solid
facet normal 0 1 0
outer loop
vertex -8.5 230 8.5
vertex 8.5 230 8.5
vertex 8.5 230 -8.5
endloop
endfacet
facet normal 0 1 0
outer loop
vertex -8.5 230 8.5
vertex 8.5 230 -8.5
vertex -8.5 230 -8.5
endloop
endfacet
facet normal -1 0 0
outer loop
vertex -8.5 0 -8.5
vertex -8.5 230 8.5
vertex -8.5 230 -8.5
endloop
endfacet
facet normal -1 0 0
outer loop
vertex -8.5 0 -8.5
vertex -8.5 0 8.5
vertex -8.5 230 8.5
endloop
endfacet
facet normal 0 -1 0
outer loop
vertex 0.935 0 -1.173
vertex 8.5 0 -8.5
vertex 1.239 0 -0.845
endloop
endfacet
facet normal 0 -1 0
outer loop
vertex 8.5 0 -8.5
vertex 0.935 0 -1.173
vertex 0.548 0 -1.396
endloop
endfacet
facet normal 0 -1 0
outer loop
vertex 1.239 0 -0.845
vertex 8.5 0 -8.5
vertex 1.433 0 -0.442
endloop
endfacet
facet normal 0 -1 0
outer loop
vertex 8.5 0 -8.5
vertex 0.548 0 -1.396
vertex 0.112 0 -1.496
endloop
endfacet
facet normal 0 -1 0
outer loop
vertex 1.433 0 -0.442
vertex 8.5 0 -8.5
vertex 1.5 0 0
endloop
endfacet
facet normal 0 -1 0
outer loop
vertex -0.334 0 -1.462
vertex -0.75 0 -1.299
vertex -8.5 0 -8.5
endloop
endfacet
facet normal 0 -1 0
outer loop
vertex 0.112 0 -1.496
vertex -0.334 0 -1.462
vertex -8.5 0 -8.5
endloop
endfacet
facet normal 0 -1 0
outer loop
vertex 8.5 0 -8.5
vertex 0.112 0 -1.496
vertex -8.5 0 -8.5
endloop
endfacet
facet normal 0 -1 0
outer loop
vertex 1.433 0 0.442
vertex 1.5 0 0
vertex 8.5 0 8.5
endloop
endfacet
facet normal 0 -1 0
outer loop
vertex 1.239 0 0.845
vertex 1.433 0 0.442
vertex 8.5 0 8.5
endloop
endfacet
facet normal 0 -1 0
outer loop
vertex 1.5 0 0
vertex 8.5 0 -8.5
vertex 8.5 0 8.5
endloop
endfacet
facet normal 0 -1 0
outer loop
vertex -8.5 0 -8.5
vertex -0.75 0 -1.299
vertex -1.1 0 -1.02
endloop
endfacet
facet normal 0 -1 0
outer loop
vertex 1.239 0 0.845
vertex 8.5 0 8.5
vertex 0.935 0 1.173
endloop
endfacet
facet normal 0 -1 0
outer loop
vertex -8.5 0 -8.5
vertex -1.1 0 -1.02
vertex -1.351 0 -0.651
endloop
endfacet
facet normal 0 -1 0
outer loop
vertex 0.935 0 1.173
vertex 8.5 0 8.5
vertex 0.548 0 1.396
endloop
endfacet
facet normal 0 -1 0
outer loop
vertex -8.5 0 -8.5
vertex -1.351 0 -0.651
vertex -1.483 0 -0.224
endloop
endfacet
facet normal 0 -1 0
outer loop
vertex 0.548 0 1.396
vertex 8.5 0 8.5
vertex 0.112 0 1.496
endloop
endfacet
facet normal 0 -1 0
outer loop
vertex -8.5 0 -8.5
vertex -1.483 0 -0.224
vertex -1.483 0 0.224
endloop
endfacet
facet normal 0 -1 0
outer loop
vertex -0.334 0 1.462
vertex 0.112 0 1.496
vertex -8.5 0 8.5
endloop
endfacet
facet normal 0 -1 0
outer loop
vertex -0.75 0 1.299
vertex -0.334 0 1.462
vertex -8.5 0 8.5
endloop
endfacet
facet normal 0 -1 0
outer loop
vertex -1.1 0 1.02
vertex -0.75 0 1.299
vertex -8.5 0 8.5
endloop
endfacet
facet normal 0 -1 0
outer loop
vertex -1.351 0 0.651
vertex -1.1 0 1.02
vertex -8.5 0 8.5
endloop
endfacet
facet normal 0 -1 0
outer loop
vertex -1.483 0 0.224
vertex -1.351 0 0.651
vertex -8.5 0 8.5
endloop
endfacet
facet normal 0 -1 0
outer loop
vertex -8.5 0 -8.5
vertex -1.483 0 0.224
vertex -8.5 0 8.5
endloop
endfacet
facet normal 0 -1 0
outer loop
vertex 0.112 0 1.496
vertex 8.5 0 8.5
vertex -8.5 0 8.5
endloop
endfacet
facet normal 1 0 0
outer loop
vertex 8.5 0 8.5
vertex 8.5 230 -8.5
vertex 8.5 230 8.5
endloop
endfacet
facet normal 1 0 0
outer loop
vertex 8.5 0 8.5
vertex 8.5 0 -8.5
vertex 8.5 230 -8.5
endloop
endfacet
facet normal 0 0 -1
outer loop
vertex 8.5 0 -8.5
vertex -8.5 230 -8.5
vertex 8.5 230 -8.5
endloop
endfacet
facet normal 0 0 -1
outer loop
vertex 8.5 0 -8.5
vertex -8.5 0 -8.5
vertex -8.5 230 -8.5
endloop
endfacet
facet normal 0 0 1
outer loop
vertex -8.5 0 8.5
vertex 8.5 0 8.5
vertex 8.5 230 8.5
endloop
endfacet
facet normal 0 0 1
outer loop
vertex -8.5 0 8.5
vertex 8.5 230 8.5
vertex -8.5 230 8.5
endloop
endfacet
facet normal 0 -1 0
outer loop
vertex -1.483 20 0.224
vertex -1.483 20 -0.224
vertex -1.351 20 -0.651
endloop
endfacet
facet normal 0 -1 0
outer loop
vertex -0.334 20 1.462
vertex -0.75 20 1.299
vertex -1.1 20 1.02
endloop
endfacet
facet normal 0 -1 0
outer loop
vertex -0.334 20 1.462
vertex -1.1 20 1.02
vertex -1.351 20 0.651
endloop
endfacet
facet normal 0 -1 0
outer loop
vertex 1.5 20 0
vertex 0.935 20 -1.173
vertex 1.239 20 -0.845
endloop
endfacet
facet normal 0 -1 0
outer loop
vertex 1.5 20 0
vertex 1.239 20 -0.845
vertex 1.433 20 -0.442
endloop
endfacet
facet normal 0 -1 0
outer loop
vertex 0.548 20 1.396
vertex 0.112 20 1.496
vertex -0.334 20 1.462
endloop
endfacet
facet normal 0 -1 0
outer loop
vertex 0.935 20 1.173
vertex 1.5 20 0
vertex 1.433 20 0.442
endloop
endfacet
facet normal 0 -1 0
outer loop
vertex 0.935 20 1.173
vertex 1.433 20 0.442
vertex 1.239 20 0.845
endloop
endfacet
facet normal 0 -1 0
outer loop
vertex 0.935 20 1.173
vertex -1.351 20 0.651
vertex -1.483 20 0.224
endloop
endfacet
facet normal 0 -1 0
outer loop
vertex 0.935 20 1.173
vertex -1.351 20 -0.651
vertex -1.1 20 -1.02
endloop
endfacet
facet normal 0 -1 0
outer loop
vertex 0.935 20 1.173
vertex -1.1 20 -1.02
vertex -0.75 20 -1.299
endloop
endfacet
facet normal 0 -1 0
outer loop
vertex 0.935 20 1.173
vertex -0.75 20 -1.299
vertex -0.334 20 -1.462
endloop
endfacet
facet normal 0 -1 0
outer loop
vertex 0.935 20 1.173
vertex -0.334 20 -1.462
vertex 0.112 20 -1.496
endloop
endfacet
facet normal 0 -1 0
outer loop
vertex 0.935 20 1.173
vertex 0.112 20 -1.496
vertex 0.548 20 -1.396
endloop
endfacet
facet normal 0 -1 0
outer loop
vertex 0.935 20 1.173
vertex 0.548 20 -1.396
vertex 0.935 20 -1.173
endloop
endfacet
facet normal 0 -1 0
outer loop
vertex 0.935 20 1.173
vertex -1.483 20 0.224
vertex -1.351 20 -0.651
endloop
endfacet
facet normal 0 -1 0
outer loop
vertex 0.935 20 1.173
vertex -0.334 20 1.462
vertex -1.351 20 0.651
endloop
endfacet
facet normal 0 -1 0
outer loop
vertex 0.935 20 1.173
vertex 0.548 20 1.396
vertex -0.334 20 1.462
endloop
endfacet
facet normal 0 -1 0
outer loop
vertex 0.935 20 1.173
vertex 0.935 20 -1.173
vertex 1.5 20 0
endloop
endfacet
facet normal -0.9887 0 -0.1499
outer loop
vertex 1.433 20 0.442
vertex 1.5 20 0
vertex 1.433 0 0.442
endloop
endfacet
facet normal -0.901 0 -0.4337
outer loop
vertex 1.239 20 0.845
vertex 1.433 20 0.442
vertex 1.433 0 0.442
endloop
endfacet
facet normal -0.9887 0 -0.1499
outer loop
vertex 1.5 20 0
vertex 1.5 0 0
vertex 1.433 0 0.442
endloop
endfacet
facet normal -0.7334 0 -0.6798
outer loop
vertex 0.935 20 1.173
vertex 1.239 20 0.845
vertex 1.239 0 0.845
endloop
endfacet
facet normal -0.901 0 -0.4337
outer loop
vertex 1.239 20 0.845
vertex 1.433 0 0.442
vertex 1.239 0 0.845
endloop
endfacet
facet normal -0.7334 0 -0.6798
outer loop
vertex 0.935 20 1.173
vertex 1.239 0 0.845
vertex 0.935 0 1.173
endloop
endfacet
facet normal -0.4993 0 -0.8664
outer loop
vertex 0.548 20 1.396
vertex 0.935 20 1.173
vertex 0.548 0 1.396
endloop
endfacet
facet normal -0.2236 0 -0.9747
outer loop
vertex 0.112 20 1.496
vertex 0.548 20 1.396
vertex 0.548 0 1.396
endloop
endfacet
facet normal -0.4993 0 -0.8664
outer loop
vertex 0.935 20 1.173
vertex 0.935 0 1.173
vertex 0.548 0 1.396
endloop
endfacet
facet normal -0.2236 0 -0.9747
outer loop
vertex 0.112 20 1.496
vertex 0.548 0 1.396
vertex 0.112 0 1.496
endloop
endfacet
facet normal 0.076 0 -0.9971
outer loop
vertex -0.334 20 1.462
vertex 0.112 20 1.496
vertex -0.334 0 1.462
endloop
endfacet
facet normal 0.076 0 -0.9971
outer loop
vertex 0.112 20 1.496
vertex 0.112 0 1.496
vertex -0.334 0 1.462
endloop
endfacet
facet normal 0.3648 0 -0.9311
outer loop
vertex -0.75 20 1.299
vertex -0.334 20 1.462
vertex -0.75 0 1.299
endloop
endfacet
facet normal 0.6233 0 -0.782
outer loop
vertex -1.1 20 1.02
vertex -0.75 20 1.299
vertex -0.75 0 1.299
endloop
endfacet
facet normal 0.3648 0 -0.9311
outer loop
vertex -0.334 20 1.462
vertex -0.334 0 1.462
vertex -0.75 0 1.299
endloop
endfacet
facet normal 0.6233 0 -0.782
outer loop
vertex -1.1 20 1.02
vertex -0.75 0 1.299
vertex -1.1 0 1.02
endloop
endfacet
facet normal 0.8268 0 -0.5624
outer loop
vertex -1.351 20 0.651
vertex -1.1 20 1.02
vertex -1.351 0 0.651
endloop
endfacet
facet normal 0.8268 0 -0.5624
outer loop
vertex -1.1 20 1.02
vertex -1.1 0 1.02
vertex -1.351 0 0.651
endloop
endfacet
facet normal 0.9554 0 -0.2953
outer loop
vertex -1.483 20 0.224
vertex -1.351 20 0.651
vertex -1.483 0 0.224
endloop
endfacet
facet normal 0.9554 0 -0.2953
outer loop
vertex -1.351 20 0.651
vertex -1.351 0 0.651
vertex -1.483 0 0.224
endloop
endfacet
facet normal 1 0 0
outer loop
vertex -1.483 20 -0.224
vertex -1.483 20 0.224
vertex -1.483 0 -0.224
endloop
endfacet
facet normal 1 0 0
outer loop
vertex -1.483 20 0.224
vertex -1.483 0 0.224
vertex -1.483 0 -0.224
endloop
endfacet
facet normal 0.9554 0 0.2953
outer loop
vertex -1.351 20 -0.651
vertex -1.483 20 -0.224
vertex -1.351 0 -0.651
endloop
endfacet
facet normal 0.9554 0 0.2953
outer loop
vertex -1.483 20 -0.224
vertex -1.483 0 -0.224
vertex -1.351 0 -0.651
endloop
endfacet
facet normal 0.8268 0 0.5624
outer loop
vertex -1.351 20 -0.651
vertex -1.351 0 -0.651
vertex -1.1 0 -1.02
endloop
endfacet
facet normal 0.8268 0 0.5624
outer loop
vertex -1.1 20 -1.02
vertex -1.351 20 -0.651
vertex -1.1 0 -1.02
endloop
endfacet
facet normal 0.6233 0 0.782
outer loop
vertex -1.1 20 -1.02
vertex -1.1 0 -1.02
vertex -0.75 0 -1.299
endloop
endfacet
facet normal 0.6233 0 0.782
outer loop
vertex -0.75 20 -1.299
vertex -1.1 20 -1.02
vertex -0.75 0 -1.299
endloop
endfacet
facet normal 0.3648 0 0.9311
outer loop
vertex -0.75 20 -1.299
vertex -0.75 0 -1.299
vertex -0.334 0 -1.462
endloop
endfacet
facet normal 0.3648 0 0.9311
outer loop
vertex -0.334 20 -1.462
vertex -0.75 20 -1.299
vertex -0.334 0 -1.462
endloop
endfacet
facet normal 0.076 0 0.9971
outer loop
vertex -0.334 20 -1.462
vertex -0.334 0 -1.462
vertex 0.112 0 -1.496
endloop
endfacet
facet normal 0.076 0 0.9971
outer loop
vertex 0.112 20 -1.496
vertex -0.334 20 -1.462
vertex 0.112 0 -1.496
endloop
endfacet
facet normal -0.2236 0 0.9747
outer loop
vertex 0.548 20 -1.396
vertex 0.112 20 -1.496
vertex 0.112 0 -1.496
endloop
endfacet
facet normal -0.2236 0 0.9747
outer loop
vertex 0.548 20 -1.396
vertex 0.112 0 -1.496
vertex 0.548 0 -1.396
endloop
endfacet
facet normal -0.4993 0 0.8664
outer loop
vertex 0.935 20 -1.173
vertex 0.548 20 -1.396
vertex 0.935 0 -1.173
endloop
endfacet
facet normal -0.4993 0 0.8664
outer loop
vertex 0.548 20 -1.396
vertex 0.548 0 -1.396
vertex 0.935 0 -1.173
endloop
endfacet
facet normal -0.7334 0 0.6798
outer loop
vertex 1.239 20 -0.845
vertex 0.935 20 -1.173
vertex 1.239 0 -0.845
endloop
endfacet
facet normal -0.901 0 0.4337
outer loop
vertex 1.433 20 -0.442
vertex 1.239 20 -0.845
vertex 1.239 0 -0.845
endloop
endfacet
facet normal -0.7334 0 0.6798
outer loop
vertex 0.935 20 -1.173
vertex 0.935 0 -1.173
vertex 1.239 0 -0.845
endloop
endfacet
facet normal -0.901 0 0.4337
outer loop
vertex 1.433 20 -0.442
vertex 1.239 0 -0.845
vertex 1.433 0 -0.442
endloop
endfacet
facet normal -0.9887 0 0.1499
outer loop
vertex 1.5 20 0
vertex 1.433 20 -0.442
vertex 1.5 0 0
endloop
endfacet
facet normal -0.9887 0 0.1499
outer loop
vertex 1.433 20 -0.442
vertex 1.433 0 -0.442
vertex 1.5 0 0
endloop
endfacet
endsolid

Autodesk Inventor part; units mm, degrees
ref_plane "YZ Plane" through (0, 0, 0) normal (1, 0, 0) x (0, 1, 0)
ref_plane "XZ Plane" through (0, 0, 0) normal (0, 1, 0) x (-1, 0, 0)
ref_plane "XY Plane" through (0, 0, 0) normal (0, 0, 1) x (1, 0, 0)
sketch "Sketch1" plane through (0, 0, 0) normal (0, 1, 0) x (-1, 0, 0)
  line L0 (-8.5, 8.5) -> (8.5, 8.5)
  line L1 (8.5, 8.5) -> (8.5, -8.5)
  line L2 (8.5, -8.5) -> (-8.5, -8.5)
  line L3 (-8.5, -8.5) -> (-8.5, 8.5)
  line L4 (-8.5, 8.5) -> (8.5, -8.5) construction
  line L5 (8.5, 8.5) -> (-8.5, -8.5) construction
  point P0 (0, 0)
  dimension "d0" = 17
  dimension "d1" = 17
extrude "Extrusion1" add sketch "Sketch1" along normal blind 230
sketch "Sketch2" plane through (0, 0, 0) normal (0, -1, 0) x (1, 0, 0)
  circle A0 centre (0, 0) radius 1.5
  dimension "d4" = 3
extrude "Extrusion2" cut sketch "Sketch2" against normal blind 20
properties part number "WoodColumn" material "Wood (Oak)"
